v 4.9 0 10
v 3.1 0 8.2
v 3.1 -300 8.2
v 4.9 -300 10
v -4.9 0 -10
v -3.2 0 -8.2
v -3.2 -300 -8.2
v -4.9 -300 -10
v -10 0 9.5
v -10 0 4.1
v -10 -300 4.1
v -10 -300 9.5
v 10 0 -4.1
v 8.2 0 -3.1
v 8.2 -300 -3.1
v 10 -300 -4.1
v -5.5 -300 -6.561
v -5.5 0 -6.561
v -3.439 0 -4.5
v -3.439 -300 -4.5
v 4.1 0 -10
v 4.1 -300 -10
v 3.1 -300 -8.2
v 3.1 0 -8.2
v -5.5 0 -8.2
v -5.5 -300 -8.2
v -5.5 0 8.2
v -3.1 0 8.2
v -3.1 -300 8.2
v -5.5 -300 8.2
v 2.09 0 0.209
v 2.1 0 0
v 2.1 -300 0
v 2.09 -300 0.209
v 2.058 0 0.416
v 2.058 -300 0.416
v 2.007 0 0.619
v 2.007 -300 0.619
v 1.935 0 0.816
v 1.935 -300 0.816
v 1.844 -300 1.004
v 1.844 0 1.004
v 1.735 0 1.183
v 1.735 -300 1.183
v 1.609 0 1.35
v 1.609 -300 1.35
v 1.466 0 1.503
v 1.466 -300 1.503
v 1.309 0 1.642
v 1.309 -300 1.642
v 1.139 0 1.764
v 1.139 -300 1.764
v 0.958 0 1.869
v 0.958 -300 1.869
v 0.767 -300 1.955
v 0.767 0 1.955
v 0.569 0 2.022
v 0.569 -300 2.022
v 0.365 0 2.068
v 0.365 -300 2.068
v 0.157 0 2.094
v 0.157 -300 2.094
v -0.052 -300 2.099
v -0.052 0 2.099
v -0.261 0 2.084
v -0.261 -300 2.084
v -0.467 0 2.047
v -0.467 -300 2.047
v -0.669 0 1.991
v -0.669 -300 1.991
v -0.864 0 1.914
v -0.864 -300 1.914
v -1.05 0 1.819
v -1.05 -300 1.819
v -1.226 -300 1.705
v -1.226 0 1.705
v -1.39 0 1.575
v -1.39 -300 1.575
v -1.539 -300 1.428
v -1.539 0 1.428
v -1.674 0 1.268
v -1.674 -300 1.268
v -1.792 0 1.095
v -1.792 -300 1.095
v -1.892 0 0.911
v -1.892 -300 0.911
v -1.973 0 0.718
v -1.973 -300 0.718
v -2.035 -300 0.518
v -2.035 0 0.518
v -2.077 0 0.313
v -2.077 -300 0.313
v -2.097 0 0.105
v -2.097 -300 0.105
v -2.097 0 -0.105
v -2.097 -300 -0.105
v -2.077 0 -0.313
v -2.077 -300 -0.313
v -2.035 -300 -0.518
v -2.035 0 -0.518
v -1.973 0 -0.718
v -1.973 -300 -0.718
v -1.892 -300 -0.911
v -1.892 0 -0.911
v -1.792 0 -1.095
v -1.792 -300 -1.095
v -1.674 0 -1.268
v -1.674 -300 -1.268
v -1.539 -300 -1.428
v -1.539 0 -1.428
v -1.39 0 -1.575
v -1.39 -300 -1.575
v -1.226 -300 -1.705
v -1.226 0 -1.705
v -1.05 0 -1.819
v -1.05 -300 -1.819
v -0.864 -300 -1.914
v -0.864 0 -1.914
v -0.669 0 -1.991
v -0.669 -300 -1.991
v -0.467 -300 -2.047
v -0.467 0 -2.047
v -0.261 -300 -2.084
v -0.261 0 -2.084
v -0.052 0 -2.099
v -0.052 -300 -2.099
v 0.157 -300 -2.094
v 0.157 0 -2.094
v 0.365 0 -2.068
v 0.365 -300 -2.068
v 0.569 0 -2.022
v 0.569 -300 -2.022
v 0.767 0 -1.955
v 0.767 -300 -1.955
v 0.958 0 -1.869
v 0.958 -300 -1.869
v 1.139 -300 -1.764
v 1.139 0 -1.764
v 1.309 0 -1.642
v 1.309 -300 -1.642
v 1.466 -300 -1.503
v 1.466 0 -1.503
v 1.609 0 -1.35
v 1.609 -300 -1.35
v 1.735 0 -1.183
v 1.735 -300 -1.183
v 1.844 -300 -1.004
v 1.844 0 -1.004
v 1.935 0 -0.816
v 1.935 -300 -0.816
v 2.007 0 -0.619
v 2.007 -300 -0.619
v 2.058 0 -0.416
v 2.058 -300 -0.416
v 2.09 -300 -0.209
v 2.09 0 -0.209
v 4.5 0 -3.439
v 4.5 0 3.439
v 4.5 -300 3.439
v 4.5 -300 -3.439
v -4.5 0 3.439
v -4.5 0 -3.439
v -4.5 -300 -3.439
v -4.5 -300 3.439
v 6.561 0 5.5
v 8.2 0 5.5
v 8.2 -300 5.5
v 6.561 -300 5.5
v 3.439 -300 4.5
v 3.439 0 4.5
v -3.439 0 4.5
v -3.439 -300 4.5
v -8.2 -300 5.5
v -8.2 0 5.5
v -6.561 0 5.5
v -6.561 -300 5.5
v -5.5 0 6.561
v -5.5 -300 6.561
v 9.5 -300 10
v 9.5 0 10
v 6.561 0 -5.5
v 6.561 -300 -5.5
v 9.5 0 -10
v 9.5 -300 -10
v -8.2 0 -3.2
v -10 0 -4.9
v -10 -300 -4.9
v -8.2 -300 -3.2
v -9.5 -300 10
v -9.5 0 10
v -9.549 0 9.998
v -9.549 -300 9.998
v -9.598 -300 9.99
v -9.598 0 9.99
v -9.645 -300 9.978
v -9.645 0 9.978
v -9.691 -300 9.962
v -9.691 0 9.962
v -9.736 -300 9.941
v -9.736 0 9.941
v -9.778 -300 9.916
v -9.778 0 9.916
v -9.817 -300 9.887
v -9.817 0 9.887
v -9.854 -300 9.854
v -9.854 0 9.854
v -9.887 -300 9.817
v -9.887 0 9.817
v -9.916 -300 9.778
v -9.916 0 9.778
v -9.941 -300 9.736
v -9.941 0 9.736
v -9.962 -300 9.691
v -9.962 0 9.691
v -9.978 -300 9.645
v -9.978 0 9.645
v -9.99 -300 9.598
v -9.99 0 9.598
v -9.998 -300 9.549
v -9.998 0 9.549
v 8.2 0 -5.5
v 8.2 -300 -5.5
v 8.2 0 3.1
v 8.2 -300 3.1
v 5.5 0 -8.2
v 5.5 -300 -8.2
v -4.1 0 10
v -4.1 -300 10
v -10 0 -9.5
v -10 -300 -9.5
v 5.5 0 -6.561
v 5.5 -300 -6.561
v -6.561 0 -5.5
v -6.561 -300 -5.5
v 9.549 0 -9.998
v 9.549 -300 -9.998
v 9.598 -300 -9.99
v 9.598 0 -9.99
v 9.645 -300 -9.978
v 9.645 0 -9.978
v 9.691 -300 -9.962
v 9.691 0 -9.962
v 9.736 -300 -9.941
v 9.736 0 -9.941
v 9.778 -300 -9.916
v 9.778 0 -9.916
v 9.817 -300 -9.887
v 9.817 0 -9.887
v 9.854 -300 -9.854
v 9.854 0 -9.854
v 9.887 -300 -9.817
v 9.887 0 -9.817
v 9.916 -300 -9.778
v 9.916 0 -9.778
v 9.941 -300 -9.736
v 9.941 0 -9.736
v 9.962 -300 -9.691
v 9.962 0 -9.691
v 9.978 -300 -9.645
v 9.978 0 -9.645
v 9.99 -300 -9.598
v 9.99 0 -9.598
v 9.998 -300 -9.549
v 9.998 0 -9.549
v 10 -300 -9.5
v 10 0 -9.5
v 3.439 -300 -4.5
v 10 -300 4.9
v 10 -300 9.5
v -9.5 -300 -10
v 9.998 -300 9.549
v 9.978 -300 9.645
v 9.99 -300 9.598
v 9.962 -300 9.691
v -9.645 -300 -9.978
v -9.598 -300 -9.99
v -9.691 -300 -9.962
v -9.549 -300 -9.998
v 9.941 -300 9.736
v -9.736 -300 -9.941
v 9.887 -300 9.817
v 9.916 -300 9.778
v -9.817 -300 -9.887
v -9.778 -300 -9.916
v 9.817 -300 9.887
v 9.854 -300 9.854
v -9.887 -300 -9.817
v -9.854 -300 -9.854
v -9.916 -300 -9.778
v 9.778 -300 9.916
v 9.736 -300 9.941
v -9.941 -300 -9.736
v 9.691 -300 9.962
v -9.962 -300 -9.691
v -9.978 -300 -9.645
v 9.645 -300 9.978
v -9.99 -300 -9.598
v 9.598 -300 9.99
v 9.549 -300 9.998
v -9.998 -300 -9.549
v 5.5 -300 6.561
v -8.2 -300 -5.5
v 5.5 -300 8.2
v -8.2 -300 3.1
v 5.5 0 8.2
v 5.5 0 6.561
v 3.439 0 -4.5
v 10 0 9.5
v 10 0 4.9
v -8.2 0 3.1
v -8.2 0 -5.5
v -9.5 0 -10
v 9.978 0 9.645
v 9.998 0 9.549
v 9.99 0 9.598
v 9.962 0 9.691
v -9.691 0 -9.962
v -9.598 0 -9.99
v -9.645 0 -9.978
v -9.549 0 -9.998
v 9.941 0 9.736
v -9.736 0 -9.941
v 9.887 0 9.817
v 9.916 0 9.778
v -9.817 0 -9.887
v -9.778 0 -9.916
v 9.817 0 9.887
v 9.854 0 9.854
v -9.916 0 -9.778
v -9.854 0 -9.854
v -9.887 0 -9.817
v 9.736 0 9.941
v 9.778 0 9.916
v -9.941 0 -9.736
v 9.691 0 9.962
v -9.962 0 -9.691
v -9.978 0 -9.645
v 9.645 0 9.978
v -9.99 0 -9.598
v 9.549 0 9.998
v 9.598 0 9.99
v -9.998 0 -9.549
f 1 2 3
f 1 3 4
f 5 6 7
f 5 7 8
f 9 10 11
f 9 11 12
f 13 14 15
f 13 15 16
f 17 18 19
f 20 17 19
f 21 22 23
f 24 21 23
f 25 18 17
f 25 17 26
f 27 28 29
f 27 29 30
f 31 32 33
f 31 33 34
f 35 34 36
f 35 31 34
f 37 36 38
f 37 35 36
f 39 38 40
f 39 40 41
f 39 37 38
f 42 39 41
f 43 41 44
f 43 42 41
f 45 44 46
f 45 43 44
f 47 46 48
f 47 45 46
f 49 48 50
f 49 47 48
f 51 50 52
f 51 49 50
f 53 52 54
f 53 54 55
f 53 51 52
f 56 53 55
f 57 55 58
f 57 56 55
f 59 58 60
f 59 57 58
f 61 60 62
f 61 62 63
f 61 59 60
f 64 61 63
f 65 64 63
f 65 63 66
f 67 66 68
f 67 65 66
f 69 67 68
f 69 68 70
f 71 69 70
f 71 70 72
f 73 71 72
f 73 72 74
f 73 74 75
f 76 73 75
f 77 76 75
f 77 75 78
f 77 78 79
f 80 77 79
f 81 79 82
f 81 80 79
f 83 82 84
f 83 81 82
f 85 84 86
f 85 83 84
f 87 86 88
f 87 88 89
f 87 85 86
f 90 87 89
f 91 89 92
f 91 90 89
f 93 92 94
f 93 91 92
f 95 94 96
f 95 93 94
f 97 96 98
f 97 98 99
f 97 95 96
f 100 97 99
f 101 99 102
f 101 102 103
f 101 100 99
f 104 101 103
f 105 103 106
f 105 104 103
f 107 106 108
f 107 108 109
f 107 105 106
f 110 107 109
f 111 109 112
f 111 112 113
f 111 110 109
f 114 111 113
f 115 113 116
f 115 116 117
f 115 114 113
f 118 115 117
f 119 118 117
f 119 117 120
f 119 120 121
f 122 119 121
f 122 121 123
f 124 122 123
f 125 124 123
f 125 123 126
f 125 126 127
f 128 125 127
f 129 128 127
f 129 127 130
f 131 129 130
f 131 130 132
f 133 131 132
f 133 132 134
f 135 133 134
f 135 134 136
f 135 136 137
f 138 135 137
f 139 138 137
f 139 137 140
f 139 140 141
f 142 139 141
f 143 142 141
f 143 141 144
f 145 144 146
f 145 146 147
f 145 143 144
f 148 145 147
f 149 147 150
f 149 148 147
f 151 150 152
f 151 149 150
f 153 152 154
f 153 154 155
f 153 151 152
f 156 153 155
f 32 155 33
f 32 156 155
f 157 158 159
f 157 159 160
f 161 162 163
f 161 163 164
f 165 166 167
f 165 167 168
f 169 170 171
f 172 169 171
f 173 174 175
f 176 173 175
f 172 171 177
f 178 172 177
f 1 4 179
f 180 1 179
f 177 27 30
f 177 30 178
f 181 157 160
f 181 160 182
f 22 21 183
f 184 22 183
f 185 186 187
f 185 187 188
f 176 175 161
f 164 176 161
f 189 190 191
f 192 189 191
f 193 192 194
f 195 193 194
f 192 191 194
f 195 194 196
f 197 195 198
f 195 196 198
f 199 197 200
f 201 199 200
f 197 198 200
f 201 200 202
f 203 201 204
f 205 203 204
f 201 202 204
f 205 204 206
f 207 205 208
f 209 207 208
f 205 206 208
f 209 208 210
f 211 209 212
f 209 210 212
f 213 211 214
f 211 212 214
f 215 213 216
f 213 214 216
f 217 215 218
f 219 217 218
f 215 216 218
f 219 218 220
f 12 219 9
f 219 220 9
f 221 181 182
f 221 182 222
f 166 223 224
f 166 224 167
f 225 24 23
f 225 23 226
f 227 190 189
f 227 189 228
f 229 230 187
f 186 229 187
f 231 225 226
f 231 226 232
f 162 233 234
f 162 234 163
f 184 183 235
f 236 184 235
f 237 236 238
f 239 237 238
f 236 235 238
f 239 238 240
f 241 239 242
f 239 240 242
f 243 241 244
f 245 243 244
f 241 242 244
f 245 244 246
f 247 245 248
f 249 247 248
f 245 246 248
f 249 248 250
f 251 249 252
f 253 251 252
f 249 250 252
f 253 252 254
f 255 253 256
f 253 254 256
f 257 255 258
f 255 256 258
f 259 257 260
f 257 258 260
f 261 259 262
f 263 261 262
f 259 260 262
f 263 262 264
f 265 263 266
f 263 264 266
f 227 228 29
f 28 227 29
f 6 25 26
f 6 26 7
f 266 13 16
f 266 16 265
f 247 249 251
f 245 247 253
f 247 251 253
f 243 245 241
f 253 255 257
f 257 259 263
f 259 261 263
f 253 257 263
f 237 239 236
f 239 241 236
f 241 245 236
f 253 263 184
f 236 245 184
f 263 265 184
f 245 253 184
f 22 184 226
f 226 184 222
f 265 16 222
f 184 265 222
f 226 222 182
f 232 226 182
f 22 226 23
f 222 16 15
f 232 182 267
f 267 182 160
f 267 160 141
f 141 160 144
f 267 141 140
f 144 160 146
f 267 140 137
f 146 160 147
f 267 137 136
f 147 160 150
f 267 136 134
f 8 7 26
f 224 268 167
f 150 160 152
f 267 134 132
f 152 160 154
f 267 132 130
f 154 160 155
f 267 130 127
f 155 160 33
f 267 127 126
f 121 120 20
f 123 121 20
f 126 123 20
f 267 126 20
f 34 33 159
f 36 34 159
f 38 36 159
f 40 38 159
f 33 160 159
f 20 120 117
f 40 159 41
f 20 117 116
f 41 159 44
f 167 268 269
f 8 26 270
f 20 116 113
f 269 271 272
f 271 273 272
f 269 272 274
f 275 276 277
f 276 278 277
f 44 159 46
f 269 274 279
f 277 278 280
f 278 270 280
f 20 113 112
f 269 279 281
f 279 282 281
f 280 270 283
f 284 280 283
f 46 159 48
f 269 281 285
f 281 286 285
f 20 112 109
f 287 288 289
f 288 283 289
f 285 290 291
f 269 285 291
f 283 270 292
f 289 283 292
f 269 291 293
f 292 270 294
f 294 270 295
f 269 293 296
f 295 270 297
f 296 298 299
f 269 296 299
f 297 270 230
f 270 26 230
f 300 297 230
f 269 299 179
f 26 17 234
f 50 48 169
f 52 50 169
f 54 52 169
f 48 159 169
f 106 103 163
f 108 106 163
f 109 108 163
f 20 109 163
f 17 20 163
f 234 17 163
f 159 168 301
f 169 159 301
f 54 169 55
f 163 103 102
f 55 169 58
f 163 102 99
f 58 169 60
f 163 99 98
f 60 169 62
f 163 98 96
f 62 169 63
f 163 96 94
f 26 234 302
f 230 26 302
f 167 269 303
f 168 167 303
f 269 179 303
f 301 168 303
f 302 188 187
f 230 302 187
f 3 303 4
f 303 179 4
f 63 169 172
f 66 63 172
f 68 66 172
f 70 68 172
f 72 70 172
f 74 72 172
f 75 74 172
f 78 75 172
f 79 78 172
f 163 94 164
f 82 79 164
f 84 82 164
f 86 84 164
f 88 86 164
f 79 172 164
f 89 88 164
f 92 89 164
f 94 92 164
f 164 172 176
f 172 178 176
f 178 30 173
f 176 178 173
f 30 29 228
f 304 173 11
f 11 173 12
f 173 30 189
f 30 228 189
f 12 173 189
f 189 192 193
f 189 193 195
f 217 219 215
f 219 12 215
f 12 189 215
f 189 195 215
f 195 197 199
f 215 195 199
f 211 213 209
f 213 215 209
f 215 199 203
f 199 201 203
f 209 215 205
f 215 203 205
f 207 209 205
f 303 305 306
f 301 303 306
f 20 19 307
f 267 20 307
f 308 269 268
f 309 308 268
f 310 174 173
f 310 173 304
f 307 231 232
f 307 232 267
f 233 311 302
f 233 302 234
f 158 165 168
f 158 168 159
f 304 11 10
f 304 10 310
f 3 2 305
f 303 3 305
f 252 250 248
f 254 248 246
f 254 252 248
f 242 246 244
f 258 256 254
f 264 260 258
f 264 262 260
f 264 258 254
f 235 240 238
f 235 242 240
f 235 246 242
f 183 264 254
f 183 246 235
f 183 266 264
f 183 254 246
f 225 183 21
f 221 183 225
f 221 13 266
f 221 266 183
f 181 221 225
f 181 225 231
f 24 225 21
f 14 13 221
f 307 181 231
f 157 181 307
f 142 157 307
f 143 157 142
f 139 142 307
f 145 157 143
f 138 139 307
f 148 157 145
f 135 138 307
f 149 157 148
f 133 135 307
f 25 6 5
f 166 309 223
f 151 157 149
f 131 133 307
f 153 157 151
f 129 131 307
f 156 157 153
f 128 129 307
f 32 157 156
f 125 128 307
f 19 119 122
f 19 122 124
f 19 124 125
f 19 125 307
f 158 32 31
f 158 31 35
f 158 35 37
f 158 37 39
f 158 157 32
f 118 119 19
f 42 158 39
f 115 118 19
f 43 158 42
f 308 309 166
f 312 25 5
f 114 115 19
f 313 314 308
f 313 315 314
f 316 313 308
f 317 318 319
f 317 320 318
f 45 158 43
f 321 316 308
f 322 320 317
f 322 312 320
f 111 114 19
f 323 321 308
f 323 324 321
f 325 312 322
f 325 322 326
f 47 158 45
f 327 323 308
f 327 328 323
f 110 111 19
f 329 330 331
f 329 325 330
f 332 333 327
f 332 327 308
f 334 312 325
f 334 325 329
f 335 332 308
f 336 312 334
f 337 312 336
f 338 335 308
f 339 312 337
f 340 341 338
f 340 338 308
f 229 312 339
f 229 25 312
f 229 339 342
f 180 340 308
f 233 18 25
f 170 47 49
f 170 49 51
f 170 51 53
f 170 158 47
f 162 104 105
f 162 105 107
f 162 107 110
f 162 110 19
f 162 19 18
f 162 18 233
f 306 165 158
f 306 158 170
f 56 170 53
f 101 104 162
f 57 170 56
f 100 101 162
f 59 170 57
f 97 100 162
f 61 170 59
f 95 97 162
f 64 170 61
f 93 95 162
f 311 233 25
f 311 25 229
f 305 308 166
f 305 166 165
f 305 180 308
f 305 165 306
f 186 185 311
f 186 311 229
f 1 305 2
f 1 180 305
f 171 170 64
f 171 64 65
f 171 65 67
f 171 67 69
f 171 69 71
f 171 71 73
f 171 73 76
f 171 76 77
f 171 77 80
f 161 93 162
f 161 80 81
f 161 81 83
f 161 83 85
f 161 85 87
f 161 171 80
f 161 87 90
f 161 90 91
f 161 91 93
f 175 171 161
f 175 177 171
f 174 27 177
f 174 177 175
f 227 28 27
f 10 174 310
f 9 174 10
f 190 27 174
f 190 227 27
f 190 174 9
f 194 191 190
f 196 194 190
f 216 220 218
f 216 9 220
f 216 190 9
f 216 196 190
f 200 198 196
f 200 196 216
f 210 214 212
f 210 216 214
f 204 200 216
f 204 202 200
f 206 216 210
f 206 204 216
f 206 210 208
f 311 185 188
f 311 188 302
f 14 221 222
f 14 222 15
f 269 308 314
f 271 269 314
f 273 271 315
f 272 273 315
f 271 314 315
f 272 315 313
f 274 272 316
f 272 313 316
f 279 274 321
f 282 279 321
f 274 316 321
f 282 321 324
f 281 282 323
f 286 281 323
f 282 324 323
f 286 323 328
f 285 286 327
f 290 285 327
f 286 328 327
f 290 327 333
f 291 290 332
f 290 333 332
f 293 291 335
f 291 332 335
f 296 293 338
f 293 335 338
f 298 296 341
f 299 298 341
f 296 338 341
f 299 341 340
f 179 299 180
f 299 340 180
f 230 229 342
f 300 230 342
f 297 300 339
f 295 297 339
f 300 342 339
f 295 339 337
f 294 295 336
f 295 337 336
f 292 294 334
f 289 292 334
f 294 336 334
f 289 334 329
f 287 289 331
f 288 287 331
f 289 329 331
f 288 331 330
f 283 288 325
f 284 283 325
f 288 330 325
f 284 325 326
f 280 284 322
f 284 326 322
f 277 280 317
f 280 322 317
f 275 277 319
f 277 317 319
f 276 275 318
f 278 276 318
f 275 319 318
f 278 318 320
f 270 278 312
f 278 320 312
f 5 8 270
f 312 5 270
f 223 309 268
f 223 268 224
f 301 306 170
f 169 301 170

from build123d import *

# Parameters (mm, degrees)
SKETCH_R  = 2.1
PAD_DEPTH = 300


with BuildPart() as part:
    # Sketch → Pad (new body)
    with BuildSketch(Plane.XZ):
        with BuildLine():
            Line((-8.2, 5.5), (-8.2, 3.1))
            Line((-10, 4.1), (-8.2, 3.1))
            Line((-10, 4.1), (-10, 9.5))
            ThreePointArc((-9.5, 10), (-9.853553, 9.853553), (-10, 9.5))
            Line((-9.5, 10), (-4.1, 10))
            Line((-4.1, 10), (-3.1, 8.2))
            Line((-3.1, 8.2), (-5.5, 8.2))
            Line((-5.5, 8.2), (-5.5, 6.56066))
            Line((-3.43934, 4.5), (-5.5, 6.56066))
            Line((3.43934, 4.5), (-3.43934, 4.5))
            Line((5.5, 6.56066), (3.43934, 4.5))
            Line((5.5, 8.2), (5.5, 6.56066))
            Line((3.1, 8.2), (5.5, 8.2))
            Line((3.1, 8.2), (4.9, 10))
            Line((4.9, 10), (9.5, 10))
            ThreePointArc((10, 9.5), (9.853553, 9.853553), (9.5, 10))
            Line((10, 9.5), (10, 4.9))
            Line((10, 4.9), (8.2, 3.1))
            Line((8.2, 3.1), (8.2, 5.5))
            Line((8.2, 5.5), (6.56066, 5.5))
            Line((6.56066, 5.5), (4.5, 3.43934))
            Line((4.5, 3.43934), (4.5, -3.43934))
            Line((4.5, -3.43934), (6.56066, -5.5))
            Line((6.56066, -5.5), (8.2, -5.5))
            Line((8.2, -5.5), (8.2, -3.1))
            Line((8.2, -3.1), (10, -4.1))
            Line((10, -4.1), (10, -9.5))
            ThreePointArc((9.5, -10), (9.853553, -9.853553), (10, -9.5))
            Line((4.1, -10), (9.5, -10))
            Line((4.1, -10), (3.1, -8.2))
            Line((3.1, -8.2), (5.5, -8.2))
            Line((5.5, -8.2), (5.5, -6.56066))
            Line((5.5, -6.56066), (3.43934, -4.5))
            Line((-3.43934, -4.5), (3.43934, -4.5))
            Line((-5.5, -6.56066), (-3.43934, -4.5))
            Line((-5.5, -6.56066), (-5.5, -8.2))
            Line((-5.5, -8.2), (-3.2, -8.2))
            Line((-3.2, -8.2), (-4.9, -10))
            Line((-4.9, -10), (-9.5, -10))
            ThreePointArc((-10, -9.5), (-9.853553, -9.853553), (-9.5, -10))
            Line((-10, -9.5), (-10, -4.9))
            Line((-10, -4.9), (-8.2, -3.2))
            Line((-8.2, -3.2), (-8.2, -5.5))
            Line((-8.2, -5.5), (-6.56066, -5.5))
            Line((-6.56066, -5.5), (-4.5, -3.43934))
            Line((-4.5, -3.43934), (-4.5, 3.43934))
            Line((-6.56066, 5.5), (-4.5, 3.43934))
            Line((-8.2, 5.5), (-6.56066, 5.5))
        make_face()
        Circle(SKETCH_R, mode=Mode.SUBTRACT)
    extrude(amount=PAD_DEPTH)


solid = part.part
